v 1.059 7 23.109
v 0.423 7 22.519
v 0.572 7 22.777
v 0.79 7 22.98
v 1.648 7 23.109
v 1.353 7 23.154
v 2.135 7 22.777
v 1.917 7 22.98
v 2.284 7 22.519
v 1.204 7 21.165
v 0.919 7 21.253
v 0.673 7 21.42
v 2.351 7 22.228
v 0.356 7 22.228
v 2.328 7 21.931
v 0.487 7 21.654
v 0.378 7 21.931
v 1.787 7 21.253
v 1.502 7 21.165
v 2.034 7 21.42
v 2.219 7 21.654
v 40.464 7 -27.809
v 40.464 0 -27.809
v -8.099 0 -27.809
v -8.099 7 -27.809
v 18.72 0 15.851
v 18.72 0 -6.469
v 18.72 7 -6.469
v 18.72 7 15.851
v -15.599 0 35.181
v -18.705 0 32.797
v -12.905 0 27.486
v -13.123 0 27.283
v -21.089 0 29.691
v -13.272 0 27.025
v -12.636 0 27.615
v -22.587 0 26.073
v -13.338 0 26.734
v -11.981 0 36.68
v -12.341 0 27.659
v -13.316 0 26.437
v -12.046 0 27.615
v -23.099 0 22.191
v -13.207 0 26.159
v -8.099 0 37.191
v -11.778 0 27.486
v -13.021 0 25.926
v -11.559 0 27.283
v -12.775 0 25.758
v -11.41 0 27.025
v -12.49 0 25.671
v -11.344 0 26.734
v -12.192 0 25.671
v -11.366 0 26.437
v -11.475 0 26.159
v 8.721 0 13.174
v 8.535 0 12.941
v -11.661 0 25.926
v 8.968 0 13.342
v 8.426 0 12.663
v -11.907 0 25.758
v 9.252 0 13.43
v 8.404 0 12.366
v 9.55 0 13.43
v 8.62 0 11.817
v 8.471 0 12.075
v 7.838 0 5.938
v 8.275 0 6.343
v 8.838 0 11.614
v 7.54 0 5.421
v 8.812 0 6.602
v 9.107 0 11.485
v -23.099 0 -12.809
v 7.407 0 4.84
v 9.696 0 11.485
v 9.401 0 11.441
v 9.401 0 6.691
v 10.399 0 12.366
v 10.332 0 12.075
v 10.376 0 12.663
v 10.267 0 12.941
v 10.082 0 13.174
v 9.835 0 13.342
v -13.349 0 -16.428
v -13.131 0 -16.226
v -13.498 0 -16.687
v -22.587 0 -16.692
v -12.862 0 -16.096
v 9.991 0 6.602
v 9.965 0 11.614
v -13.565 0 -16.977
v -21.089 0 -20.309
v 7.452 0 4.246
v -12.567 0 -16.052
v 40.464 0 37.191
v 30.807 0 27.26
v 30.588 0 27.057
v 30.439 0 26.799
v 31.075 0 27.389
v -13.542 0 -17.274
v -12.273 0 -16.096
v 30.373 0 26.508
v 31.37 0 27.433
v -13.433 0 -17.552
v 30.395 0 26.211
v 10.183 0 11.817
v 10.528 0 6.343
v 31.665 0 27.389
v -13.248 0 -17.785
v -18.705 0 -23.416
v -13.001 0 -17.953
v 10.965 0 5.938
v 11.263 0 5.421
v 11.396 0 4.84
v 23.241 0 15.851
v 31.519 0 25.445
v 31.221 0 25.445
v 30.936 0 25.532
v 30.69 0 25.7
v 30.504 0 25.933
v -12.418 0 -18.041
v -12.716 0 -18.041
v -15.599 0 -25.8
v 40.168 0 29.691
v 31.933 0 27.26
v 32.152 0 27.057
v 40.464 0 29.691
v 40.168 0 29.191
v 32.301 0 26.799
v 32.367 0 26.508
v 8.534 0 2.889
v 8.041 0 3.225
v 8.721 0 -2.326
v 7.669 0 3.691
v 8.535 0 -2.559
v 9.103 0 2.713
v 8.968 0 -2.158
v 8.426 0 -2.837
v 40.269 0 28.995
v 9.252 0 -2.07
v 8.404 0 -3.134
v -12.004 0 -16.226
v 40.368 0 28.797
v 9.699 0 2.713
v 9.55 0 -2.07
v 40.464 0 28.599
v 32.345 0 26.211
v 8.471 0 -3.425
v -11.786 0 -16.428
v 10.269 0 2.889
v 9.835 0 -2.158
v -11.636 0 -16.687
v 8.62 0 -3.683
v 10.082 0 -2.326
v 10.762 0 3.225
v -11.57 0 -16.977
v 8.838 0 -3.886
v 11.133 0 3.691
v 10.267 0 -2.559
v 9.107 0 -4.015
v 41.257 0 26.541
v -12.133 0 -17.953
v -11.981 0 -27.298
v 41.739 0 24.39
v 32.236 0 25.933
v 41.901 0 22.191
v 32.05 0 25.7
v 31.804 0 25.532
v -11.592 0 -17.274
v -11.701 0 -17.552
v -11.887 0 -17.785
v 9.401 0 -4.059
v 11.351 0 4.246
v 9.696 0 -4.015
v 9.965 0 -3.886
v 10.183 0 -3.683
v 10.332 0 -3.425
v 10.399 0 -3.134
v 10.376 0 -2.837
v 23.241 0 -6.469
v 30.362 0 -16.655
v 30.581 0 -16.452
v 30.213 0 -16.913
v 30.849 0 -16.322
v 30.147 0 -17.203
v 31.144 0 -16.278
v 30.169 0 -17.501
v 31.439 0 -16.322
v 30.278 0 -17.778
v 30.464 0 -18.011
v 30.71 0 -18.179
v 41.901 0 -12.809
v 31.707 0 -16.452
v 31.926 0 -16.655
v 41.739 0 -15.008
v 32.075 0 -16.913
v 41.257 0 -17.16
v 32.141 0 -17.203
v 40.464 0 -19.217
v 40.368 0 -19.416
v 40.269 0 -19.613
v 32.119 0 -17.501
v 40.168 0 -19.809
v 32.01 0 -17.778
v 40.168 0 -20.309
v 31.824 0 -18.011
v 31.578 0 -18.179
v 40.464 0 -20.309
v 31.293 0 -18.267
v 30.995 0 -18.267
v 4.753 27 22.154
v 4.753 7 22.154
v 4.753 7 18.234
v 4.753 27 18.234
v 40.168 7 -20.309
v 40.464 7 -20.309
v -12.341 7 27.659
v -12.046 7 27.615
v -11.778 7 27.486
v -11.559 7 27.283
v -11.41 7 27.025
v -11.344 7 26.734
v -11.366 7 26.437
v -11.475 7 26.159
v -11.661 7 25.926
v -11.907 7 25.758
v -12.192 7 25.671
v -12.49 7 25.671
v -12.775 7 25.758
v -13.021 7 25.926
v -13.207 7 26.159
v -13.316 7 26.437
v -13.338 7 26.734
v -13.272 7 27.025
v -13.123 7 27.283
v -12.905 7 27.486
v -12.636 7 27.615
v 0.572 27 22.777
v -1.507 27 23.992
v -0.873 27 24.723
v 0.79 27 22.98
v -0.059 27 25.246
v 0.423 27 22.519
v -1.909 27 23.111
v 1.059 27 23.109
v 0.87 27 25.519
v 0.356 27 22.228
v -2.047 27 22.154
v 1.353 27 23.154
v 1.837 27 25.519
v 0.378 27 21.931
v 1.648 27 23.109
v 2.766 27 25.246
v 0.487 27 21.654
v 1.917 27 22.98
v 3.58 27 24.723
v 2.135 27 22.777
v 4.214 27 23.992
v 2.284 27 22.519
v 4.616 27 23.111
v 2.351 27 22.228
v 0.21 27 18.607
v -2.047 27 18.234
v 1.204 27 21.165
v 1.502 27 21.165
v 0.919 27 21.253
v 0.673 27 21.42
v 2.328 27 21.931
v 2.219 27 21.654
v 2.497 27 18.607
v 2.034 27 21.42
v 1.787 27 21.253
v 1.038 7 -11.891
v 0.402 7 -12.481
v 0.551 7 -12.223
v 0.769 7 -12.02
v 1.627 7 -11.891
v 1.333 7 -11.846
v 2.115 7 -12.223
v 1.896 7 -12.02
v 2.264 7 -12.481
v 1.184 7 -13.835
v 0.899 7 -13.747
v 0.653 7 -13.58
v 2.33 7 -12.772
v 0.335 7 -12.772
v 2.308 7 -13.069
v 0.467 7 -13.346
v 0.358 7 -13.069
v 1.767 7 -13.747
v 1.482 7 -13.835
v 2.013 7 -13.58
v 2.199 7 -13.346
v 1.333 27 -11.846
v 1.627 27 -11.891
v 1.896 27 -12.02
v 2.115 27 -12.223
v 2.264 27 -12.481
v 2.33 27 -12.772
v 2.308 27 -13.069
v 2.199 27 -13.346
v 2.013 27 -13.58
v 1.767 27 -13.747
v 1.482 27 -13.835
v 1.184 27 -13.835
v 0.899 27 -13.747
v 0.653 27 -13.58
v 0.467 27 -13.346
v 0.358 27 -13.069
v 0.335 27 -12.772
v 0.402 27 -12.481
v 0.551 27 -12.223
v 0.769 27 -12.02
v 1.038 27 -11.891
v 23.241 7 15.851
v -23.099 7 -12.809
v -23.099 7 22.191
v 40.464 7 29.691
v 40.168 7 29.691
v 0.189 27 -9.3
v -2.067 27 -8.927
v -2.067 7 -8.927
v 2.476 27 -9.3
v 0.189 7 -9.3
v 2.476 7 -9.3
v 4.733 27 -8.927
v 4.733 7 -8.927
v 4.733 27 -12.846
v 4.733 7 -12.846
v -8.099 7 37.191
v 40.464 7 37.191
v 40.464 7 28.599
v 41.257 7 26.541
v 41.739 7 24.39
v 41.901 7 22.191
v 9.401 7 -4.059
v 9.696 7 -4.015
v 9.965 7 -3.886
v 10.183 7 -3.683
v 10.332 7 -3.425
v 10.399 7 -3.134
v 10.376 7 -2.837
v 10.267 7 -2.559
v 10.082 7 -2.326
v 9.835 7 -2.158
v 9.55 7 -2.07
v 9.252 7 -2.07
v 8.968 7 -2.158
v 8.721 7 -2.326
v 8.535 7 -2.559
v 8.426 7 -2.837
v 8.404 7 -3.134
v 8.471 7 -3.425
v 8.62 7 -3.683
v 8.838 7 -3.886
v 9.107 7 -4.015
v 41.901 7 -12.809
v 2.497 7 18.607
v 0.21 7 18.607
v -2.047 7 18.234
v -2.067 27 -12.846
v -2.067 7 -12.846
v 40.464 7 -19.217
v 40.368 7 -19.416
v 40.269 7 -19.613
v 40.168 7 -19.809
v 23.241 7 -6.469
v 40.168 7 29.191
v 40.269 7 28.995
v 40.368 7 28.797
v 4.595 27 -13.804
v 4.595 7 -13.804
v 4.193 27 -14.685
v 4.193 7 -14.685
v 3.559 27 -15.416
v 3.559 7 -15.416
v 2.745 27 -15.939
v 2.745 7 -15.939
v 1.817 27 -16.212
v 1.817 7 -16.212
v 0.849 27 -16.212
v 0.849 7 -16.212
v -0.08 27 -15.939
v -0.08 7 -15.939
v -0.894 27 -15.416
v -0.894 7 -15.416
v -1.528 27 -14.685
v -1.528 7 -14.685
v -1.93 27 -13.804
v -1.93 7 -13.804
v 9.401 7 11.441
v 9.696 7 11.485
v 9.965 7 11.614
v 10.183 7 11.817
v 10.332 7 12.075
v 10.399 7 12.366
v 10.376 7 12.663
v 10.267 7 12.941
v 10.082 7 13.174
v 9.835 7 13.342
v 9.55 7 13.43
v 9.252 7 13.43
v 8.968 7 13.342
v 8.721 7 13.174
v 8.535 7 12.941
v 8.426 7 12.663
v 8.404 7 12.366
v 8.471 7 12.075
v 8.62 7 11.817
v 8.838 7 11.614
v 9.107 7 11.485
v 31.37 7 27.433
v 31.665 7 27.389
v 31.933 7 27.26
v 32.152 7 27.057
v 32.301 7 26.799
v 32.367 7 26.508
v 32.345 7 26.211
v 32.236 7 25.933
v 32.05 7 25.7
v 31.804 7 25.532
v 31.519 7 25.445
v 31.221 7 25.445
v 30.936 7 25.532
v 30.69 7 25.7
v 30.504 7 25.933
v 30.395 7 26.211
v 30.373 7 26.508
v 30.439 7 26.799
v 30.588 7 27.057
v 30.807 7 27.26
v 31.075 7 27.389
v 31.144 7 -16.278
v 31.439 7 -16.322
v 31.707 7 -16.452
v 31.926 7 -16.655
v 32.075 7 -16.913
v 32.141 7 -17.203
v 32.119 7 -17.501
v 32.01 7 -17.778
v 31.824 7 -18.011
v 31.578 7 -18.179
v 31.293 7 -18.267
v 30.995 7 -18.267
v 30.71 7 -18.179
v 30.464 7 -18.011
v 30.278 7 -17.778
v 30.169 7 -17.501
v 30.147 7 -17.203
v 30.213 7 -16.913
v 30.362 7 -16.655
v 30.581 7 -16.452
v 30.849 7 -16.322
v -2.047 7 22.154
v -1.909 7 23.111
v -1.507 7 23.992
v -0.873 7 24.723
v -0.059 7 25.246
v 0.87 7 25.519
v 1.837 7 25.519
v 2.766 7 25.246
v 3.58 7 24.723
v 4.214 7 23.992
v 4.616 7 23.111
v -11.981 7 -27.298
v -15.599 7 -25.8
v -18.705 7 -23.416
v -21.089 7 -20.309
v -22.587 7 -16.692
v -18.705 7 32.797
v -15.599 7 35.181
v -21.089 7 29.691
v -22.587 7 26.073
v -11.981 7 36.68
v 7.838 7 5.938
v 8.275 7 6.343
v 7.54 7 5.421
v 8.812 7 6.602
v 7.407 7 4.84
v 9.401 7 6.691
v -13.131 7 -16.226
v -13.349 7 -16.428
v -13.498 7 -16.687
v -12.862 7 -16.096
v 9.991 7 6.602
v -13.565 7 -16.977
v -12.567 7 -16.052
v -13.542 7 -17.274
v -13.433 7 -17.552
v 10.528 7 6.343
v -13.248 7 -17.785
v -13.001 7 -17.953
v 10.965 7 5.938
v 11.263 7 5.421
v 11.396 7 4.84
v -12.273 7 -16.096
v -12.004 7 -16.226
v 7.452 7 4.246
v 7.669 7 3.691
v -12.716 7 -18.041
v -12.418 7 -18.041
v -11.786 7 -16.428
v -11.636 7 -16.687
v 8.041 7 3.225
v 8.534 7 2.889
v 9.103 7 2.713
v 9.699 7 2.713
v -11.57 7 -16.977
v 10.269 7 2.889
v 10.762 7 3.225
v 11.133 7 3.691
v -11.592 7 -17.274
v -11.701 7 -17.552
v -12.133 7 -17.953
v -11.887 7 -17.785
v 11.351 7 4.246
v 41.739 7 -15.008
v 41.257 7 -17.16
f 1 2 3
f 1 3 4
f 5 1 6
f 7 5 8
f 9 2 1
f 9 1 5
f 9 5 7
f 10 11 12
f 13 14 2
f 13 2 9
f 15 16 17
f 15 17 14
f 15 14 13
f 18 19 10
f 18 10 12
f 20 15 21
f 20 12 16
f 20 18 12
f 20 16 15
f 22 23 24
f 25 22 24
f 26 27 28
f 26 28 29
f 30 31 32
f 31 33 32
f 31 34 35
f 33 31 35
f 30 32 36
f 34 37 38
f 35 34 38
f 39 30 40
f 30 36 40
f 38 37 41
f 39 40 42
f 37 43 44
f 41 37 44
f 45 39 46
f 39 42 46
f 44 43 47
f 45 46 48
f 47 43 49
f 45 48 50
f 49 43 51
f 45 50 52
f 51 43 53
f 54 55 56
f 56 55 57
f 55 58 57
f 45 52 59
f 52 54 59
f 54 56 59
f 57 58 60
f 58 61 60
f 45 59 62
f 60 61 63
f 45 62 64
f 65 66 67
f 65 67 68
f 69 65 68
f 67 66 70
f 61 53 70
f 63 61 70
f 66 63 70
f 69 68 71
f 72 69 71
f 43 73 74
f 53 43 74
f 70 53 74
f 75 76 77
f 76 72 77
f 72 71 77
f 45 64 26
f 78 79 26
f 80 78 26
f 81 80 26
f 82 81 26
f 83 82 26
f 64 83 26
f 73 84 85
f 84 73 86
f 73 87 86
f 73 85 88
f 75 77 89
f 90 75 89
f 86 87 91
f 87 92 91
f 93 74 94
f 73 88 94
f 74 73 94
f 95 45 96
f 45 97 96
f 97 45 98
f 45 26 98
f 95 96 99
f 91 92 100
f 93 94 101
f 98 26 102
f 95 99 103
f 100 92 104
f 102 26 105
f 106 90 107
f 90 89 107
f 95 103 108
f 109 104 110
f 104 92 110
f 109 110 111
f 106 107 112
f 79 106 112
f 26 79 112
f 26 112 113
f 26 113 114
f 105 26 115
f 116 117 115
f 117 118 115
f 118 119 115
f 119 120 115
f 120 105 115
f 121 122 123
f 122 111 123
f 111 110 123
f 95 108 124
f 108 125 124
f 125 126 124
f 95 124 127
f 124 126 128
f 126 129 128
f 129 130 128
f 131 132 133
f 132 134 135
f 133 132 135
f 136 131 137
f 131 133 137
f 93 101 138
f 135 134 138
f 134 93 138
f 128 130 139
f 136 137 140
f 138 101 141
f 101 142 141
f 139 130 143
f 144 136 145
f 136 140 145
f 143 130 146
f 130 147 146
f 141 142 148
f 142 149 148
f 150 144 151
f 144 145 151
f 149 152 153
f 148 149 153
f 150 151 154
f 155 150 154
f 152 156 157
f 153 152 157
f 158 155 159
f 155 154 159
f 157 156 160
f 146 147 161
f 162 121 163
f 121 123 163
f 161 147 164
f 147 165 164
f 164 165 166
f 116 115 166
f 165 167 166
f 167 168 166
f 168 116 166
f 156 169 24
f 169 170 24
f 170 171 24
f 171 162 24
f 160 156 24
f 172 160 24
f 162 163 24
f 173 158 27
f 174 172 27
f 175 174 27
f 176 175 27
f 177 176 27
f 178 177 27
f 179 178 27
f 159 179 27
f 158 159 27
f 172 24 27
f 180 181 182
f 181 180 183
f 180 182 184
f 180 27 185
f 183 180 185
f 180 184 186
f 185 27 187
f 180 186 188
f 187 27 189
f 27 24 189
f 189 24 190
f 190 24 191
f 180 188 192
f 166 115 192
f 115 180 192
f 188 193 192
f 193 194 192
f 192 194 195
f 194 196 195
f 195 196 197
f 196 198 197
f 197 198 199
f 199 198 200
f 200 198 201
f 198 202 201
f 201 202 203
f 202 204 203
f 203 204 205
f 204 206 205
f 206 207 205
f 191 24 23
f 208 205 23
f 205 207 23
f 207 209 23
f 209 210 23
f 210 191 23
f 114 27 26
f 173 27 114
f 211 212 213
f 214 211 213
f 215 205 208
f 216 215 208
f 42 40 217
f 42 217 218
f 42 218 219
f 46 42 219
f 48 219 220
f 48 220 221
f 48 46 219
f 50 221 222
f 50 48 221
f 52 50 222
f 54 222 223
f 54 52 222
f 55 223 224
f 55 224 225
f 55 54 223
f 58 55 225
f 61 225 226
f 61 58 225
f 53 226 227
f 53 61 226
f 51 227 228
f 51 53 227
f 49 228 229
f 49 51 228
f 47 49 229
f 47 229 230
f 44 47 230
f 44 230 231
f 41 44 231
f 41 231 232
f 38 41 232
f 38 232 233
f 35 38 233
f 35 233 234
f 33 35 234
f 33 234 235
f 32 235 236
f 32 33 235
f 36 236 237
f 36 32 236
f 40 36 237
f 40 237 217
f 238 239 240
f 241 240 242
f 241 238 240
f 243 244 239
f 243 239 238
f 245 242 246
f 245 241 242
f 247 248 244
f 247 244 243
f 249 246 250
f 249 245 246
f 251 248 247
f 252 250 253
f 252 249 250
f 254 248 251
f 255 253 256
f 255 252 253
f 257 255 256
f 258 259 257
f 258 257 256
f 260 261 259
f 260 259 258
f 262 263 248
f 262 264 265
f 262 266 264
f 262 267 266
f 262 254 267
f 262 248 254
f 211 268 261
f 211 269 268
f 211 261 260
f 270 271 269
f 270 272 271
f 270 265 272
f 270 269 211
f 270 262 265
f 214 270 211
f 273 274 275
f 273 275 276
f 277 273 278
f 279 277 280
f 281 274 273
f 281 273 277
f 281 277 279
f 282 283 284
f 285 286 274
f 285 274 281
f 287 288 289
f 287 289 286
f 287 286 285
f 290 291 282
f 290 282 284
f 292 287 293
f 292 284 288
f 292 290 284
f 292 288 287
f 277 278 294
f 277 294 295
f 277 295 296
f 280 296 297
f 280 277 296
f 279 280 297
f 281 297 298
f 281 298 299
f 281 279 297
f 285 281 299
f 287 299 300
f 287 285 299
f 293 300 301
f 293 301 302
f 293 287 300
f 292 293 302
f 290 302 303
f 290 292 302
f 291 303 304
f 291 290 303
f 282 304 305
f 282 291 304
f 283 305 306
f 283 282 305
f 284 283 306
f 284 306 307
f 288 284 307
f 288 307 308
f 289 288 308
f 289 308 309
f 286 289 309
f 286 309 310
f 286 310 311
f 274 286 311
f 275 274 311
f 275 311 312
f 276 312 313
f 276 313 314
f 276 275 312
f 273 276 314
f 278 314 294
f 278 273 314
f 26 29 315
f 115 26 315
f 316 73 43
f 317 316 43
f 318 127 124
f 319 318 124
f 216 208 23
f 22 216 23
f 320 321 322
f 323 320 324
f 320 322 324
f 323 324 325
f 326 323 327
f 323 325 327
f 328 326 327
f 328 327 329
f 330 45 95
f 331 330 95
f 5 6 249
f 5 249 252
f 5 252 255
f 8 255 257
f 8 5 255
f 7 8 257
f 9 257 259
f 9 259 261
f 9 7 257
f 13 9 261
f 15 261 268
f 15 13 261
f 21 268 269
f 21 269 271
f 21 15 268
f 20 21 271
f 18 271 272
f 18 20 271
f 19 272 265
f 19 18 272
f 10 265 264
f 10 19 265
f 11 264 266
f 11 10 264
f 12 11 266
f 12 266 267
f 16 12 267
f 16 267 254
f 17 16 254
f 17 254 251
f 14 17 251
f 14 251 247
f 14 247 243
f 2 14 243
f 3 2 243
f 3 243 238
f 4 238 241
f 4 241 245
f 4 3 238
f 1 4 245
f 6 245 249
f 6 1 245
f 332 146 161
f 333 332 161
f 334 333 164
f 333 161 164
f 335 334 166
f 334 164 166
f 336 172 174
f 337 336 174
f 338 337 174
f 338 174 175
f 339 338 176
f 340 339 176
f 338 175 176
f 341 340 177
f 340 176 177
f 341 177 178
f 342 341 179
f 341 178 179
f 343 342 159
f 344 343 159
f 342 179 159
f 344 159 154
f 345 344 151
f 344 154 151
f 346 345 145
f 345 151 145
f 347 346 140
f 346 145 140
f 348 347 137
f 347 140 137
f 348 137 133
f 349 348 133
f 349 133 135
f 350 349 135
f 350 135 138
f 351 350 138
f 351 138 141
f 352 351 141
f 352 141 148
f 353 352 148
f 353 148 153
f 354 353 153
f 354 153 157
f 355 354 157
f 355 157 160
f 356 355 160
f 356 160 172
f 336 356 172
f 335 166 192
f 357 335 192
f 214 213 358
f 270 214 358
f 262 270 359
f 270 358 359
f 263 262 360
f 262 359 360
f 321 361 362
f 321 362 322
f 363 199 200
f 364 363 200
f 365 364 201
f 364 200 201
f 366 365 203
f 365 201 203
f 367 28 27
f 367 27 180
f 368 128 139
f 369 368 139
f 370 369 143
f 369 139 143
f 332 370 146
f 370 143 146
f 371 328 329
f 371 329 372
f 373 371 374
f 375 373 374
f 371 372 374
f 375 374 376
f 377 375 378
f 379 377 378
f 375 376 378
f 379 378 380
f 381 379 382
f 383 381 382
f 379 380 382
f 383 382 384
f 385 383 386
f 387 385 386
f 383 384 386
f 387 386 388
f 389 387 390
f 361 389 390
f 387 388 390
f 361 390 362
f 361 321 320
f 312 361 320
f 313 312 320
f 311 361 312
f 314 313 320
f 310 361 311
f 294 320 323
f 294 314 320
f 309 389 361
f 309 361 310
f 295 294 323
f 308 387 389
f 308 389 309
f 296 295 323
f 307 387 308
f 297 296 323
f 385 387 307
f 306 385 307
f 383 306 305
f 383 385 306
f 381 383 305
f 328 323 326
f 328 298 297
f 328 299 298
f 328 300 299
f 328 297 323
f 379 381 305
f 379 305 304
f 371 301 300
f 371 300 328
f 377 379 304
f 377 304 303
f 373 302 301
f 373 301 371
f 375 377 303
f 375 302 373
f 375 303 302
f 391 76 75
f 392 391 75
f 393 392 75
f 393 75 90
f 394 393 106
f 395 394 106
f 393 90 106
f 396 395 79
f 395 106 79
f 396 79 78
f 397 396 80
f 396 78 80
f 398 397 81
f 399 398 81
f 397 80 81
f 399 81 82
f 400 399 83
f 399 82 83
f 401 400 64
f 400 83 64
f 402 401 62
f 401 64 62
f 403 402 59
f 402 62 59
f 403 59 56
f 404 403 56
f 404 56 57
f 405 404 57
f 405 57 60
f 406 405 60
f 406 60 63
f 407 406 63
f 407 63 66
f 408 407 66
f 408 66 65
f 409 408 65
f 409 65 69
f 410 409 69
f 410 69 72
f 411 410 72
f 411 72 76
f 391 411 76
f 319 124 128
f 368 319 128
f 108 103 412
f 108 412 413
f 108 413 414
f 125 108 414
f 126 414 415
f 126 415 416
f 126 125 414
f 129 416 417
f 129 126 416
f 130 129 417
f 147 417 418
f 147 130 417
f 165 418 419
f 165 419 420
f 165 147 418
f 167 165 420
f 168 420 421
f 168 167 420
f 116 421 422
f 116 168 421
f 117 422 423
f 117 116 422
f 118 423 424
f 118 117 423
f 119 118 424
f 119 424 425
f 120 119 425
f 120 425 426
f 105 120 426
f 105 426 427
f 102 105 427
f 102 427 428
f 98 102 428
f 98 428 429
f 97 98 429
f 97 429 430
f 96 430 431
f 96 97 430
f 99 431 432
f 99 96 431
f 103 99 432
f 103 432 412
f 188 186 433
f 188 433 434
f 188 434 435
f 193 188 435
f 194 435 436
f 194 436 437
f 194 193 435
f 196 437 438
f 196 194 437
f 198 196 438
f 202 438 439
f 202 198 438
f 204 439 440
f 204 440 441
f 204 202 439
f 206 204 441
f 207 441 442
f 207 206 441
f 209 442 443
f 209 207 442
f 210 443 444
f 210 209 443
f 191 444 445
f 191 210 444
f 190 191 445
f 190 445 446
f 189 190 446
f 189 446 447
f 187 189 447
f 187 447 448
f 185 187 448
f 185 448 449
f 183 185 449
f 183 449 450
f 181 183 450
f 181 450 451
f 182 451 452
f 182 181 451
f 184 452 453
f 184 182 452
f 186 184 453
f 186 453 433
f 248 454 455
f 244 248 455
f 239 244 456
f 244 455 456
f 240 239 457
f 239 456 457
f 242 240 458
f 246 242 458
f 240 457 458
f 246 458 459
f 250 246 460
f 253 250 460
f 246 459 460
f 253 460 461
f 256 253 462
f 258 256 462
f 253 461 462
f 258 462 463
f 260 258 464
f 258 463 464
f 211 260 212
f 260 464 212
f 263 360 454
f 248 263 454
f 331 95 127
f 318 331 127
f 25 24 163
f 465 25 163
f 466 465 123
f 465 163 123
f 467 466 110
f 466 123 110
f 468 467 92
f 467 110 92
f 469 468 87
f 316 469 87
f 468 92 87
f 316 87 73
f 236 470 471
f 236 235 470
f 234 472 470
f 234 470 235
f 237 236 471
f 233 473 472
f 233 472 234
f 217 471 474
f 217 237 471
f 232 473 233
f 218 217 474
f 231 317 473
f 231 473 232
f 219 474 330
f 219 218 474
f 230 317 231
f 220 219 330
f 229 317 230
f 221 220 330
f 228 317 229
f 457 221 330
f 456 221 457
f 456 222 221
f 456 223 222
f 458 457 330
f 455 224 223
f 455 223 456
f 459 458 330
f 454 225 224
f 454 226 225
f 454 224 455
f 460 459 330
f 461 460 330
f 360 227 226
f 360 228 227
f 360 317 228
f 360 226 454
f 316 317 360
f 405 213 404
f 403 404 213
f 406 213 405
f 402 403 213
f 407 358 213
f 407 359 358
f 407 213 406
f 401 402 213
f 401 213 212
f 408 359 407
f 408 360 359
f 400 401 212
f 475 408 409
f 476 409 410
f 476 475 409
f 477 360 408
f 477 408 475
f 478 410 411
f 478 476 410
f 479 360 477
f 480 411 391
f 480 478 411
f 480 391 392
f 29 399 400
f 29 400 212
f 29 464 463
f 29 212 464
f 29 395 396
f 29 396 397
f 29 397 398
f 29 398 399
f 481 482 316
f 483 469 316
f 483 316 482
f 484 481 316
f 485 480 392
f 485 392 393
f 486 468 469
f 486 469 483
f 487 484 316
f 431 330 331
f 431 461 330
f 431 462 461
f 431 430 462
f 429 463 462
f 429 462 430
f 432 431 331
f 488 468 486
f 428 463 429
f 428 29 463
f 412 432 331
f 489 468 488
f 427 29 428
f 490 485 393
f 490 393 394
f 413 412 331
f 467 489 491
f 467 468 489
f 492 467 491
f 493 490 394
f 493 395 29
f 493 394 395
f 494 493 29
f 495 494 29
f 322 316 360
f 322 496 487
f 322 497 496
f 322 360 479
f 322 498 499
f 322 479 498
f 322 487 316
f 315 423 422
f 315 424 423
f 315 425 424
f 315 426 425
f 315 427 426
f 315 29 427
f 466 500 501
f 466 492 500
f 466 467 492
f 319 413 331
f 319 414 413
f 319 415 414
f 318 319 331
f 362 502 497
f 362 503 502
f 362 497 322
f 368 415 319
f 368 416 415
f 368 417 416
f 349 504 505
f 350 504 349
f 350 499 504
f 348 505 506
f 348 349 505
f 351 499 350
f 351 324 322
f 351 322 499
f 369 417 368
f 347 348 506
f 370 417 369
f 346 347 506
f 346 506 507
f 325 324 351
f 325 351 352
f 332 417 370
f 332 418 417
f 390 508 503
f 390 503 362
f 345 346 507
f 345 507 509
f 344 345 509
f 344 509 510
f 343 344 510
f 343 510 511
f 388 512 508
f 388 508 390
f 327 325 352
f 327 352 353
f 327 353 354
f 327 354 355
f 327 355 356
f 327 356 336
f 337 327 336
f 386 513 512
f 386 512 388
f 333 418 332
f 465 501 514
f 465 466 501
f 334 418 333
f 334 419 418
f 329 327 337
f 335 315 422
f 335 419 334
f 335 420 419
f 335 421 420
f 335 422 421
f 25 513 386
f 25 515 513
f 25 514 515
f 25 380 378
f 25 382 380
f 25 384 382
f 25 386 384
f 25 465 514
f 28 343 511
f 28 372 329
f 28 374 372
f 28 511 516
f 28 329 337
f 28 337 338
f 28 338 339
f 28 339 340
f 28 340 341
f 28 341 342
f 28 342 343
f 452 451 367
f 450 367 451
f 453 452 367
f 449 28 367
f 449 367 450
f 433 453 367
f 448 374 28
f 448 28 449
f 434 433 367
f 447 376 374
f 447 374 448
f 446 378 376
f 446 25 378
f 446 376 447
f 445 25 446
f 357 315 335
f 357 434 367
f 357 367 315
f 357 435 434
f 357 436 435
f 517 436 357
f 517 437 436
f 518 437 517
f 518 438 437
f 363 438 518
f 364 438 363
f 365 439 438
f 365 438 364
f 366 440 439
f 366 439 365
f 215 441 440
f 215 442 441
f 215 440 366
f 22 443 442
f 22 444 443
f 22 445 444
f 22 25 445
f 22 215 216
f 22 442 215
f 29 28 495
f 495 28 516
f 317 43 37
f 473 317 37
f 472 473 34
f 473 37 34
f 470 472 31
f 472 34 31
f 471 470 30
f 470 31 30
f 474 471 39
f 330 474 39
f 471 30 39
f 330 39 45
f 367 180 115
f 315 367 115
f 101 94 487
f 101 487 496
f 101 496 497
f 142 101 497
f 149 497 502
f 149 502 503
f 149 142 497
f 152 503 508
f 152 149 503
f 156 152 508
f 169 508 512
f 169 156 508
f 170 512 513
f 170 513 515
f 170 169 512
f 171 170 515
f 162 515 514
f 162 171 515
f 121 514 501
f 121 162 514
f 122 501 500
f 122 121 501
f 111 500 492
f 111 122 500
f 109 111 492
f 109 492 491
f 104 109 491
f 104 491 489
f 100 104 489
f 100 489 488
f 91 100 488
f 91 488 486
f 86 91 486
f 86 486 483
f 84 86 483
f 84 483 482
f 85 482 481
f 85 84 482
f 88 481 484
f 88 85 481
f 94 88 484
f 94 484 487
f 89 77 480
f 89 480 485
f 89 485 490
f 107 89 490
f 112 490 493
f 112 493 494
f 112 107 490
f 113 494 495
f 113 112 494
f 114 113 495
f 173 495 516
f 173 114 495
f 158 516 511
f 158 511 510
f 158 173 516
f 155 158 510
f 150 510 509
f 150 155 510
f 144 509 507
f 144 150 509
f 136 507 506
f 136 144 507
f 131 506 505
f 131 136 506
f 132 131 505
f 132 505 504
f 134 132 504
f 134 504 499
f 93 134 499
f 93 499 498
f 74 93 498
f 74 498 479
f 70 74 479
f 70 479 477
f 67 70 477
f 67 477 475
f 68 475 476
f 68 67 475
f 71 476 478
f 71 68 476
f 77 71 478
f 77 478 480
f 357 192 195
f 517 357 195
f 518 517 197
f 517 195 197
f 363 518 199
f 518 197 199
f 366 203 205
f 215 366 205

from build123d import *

# Parameters (mm, degrees)
SKETCH1_R           = 25.5
SKETCH1_R_2         = 1
SKETCH1_R_3         = 2
BOSS_EXTRUDE4_DEPTH = 7
SKETCH3_R           = 1
BOSS_EXTRUDE6_DEPTH = 20
SKETCH4_R           = 1
SKETCH4_W           = 4.52162884
SKETCH4_H           = 22.32
CUT_EXTRUDE2_DEPTH  = 10


with BuildPart() as part:
    # Sketch1 → Boss-Extrude4 (new body)
    with BuildSketch(Plane(origin=(0, 0, 0), x_dir=(1, 0, 0), z_dir=(0, 1, 0))):
        with BuildLine():
            Line((-23.098597486, 12.80927662), (-23.098597486, -22.19072338))
            ThreePointArc((-23.098597486, -22.19072338), (-18.705199204, -32.797325098), (-8.098597486, -37.19072338))
            Line((-8.098597486, -37.19072338), (40.463784198, -37.19072338))
            Line((40.463784198, -37.19072338), (40.463784198, -29.69072338))
            Line((40.463784198, -29.69072338), (40.167901675, -29.69072338))
            Line((40.167901675, -29.69072338), (40.167901675, -29.19072338))
            ThreePointArc((40.167901675, -29.19072338), (40.319108843, -28.896329756), (40.463784198, -28.598671807))
            ThreePointArc((40.463784198, -28.598671807), (41.53758585, -25.474339887), (41.901402514, -22.19072338))
            Line((41.901402514, -22.19072338), (41.901402514, 12.80927662))
            ThreePointArc((41.901402514, 12.80927662), (41.53758585, 16.092893127), (40.463784198, 19.217225047))
            ThreePointArc((40.463784198, 19.217225047), (40.319108843, 19.514882996), (40.167901675, 19.80927662))
            Line((40.167901675, 19.80927662), (40.167901675, 20.30927662))
            Line((40.167901675, 20.30927662), (40.463784198, 20.30927662))
            Line((40.463784198, 20.30927662), (40.463784198, 27.80927662))
            Line((40.463784198, 27.80927662), (-8.098597486, 27.80927662))
            ThreePointArc((-8.098597486, 27.80927662), (-18.705199204, 23.415878338), (-23.098597486, 12.80927662))
        make_face()
        with Locations((9.401402514, -4.69072338)):
            Circle(SKETCH1_R, mode=Mode.SUBTRACT)
        with Locations(Location((31.144043201, 17.278011972, 0), (0, 0, 270))):
            Circle(SKETCH1_R_2, mode=Mode.SUBTRACT)
        with Locations(Location((-12.567332839, 17.051917307, 0), (0, 0, 270))):
            Circle(SKETCH1_R_2, mode=Mode.SUBTRACT)
        with Locations(Location((-12.341238173, -26.659458733, 0), (0, 0, 270))):
            Circle(SKETCH1_R_2, mode=Mode.SUBTRACT)
        with Locations(Location((31.370137866, -26.433364067, 0), (0, 0, 270))):
            Circle(SKETCH1_R_2, mode=Mode.SUBTRACT)
        with Locations((9.401402514, -4.69072338)):
            Circle(SKETCH1_R)
        with Locations(Location((9.401402514, -4.69072338, 0), (0, 0, 270))):
            Circle(SKETCH1_R_3, mode=Mode.SUBTRACT)
    extrude(amount=BOSS_EXTRUDE4_DEPTH)

    # Sketch3 → Boss-Extrude6 (add)
    with BuildSketch(Plane(origin=(0, 7, 0), x_dir=(1, 0, 0), z_dir=(0, 1, 0))):
        with BuildLine():
            Line((-2.046619841, -18.234374208), (-2.046619841, -22.153505311))
            ThreePointArc((-2.046619841, -22.153505311), (1.353380159, -25.553505311), (4.753380159, -22.153505311))
            Line((4.753380159, -22.153505311), (4.753380159, -18.234374208))
            ThreePointArc((4.753380159, -18.234374208), (1.353380159, -18.653505311), (-2.046619841, -18.234374208))
        make_face()
        with Locations(Location((1.353380159, -22.153505311, 0), (0, 0, 270))):
            Circle(SKETCH3_R, mode=Mode.SUBTRACT)
        with BuildLine():
            Line((4.732675534, 8.927357463), (4.732675534, 12.846488565))
            ThreePointArc((4.732675534, 12.846488565), (1.332675534, 16.246488565), (-2.067324466, 12.846488565))
            Line((-2.067324466, 12.846488565), (-2.067324466, 8.927357463))
            ThreePointArc((-2.067324466, 8.927357463), (1.332675534, 9.346488565), (4.732675534, 8.927357463))
        make_face()
        with Locations(Location((1.332675534, 12.846488565, 0), (0, 0, 270))):
            Circle(SKETCH3_R, mode=Mode.SUBTRACT)
    extrude(amount=BOSS_EXTRUDE6_DEPTH)

    # Sketch4 → Cut-Extrude2 (cut)
    with BuildSketch(Plane.XZ):
        with Locations(Location((9.401402514, -3.05927662, 0), (0, 0, 270))):
            Circle(SKETCH4_R)
        with Locations(Location((9.401402514, 12.44072338, 0), (0, 0, 270))):
            Circle(SKETCH4_R)
        with Locations((20.980588094, 4.69072338)):
            Rectangle(SKETCH4_W, SKETCH4_H)
    extrude(amount=-CUT_EXTRUDE2_DEPTH, mode=Mode.SUBTRACT)


solid = part.part
